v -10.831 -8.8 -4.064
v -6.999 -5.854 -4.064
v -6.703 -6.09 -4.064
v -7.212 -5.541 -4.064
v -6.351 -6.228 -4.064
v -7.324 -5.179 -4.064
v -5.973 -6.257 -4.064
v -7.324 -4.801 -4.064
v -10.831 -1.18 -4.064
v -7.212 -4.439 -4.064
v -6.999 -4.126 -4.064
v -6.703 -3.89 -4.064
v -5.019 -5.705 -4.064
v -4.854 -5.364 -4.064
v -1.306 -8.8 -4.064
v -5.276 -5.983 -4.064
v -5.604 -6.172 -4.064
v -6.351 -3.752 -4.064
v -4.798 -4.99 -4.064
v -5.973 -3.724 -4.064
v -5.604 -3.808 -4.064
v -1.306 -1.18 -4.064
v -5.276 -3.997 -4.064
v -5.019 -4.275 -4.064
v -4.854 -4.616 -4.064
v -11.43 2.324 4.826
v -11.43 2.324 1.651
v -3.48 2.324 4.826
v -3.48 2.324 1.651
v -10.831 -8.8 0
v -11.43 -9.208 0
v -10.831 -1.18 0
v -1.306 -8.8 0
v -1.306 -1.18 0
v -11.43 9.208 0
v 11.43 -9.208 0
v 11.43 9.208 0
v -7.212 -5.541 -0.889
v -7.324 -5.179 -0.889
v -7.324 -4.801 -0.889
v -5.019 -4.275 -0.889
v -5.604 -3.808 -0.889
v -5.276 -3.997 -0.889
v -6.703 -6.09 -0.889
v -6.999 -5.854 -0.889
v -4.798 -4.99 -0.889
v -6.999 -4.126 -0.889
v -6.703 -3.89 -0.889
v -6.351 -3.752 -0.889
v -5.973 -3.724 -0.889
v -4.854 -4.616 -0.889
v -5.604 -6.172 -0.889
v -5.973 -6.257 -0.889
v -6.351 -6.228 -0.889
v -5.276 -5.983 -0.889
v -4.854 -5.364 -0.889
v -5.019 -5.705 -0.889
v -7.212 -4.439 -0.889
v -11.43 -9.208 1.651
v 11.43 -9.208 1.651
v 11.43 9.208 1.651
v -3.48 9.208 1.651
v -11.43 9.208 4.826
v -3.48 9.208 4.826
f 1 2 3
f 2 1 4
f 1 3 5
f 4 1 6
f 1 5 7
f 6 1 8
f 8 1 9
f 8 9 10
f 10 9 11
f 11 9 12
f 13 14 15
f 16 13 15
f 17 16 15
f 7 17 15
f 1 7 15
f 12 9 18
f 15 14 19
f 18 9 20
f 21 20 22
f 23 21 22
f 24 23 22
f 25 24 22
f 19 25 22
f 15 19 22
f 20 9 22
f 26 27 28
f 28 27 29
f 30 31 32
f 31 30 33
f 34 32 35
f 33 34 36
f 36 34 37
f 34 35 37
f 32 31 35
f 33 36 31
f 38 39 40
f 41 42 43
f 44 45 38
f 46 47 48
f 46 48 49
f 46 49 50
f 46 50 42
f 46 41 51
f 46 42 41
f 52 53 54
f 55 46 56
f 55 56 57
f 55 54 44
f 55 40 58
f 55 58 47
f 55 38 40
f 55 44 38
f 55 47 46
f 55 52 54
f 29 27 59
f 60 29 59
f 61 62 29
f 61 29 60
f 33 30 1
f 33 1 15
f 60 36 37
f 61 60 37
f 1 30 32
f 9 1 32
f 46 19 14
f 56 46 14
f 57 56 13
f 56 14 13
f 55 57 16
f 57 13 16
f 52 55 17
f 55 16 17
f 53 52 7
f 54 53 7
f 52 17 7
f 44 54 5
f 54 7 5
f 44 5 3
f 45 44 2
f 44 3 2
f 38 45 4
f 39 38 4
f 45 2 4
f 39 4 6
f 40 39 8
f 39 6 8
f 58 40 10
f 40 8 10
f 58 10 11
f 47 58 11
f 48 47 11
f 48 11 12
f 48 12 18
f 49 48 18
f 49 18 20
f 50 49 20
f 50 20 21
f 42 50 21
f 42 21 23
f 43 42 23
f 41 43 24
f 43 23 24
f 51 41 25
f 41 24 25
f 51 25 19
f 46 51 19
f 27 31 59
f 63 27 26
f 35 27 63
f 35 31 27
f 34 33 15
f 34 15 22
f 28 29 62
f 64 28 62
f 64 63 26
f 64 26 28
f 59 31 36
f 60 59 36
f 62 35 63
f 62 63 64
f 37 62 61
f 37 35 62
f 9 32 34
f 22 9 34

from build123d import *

# Parameters (mm, degrees)
F0_W     = 22.86
F0_H     = 18.415
F1_DEPTH = 1.651
F2_W     = 7.9502
F2_H     = 6.8834
F3_DEPTH = 3.175
F4_W     = 9.525
F4_H     = 7.62
F5_DEPTH = 4.064
F6_R     = 1.27
F7_DEPTH = 3.175


with BuildPart() as f1:
    # F0 (on Top) → F1 (new body)
    with BuildSketch(Plane.XY):
        Rectangle(F0_W, F0_H)
    extrude(amount=F1_DEPTH)

    # F2 (on face) → F3 (join)
    with BuildSketch(Plane.XY.offset(1.651)):
        with Locations((-7.4549, 5.7658)):
            Rectangle(F2_W, F2_H)
    extrude(amount=F3_DEPTH)

    # F4 (on Top) → F5 (join)
    with BuildSketch(Plane.XY):
        with Locations((-6.068009, -4.990071)):
            Rectangle(F4_W, F4_H)
    extrude(amount=-F5_DEPTH)

    # F6 (on face) → F7 (cut)
    with BuildSketch(Plane(origin=(0, 0, -4.064), x_dir=(1, 0, 0), z_dir=(0, 0, -1))):
        with Locations((-6.068009, 4.990071)):
            Circle(F6_R)
    extrude(amount=-F7_DEPTH, mode=Mode.SUBTRACT)


solid = f1.part
